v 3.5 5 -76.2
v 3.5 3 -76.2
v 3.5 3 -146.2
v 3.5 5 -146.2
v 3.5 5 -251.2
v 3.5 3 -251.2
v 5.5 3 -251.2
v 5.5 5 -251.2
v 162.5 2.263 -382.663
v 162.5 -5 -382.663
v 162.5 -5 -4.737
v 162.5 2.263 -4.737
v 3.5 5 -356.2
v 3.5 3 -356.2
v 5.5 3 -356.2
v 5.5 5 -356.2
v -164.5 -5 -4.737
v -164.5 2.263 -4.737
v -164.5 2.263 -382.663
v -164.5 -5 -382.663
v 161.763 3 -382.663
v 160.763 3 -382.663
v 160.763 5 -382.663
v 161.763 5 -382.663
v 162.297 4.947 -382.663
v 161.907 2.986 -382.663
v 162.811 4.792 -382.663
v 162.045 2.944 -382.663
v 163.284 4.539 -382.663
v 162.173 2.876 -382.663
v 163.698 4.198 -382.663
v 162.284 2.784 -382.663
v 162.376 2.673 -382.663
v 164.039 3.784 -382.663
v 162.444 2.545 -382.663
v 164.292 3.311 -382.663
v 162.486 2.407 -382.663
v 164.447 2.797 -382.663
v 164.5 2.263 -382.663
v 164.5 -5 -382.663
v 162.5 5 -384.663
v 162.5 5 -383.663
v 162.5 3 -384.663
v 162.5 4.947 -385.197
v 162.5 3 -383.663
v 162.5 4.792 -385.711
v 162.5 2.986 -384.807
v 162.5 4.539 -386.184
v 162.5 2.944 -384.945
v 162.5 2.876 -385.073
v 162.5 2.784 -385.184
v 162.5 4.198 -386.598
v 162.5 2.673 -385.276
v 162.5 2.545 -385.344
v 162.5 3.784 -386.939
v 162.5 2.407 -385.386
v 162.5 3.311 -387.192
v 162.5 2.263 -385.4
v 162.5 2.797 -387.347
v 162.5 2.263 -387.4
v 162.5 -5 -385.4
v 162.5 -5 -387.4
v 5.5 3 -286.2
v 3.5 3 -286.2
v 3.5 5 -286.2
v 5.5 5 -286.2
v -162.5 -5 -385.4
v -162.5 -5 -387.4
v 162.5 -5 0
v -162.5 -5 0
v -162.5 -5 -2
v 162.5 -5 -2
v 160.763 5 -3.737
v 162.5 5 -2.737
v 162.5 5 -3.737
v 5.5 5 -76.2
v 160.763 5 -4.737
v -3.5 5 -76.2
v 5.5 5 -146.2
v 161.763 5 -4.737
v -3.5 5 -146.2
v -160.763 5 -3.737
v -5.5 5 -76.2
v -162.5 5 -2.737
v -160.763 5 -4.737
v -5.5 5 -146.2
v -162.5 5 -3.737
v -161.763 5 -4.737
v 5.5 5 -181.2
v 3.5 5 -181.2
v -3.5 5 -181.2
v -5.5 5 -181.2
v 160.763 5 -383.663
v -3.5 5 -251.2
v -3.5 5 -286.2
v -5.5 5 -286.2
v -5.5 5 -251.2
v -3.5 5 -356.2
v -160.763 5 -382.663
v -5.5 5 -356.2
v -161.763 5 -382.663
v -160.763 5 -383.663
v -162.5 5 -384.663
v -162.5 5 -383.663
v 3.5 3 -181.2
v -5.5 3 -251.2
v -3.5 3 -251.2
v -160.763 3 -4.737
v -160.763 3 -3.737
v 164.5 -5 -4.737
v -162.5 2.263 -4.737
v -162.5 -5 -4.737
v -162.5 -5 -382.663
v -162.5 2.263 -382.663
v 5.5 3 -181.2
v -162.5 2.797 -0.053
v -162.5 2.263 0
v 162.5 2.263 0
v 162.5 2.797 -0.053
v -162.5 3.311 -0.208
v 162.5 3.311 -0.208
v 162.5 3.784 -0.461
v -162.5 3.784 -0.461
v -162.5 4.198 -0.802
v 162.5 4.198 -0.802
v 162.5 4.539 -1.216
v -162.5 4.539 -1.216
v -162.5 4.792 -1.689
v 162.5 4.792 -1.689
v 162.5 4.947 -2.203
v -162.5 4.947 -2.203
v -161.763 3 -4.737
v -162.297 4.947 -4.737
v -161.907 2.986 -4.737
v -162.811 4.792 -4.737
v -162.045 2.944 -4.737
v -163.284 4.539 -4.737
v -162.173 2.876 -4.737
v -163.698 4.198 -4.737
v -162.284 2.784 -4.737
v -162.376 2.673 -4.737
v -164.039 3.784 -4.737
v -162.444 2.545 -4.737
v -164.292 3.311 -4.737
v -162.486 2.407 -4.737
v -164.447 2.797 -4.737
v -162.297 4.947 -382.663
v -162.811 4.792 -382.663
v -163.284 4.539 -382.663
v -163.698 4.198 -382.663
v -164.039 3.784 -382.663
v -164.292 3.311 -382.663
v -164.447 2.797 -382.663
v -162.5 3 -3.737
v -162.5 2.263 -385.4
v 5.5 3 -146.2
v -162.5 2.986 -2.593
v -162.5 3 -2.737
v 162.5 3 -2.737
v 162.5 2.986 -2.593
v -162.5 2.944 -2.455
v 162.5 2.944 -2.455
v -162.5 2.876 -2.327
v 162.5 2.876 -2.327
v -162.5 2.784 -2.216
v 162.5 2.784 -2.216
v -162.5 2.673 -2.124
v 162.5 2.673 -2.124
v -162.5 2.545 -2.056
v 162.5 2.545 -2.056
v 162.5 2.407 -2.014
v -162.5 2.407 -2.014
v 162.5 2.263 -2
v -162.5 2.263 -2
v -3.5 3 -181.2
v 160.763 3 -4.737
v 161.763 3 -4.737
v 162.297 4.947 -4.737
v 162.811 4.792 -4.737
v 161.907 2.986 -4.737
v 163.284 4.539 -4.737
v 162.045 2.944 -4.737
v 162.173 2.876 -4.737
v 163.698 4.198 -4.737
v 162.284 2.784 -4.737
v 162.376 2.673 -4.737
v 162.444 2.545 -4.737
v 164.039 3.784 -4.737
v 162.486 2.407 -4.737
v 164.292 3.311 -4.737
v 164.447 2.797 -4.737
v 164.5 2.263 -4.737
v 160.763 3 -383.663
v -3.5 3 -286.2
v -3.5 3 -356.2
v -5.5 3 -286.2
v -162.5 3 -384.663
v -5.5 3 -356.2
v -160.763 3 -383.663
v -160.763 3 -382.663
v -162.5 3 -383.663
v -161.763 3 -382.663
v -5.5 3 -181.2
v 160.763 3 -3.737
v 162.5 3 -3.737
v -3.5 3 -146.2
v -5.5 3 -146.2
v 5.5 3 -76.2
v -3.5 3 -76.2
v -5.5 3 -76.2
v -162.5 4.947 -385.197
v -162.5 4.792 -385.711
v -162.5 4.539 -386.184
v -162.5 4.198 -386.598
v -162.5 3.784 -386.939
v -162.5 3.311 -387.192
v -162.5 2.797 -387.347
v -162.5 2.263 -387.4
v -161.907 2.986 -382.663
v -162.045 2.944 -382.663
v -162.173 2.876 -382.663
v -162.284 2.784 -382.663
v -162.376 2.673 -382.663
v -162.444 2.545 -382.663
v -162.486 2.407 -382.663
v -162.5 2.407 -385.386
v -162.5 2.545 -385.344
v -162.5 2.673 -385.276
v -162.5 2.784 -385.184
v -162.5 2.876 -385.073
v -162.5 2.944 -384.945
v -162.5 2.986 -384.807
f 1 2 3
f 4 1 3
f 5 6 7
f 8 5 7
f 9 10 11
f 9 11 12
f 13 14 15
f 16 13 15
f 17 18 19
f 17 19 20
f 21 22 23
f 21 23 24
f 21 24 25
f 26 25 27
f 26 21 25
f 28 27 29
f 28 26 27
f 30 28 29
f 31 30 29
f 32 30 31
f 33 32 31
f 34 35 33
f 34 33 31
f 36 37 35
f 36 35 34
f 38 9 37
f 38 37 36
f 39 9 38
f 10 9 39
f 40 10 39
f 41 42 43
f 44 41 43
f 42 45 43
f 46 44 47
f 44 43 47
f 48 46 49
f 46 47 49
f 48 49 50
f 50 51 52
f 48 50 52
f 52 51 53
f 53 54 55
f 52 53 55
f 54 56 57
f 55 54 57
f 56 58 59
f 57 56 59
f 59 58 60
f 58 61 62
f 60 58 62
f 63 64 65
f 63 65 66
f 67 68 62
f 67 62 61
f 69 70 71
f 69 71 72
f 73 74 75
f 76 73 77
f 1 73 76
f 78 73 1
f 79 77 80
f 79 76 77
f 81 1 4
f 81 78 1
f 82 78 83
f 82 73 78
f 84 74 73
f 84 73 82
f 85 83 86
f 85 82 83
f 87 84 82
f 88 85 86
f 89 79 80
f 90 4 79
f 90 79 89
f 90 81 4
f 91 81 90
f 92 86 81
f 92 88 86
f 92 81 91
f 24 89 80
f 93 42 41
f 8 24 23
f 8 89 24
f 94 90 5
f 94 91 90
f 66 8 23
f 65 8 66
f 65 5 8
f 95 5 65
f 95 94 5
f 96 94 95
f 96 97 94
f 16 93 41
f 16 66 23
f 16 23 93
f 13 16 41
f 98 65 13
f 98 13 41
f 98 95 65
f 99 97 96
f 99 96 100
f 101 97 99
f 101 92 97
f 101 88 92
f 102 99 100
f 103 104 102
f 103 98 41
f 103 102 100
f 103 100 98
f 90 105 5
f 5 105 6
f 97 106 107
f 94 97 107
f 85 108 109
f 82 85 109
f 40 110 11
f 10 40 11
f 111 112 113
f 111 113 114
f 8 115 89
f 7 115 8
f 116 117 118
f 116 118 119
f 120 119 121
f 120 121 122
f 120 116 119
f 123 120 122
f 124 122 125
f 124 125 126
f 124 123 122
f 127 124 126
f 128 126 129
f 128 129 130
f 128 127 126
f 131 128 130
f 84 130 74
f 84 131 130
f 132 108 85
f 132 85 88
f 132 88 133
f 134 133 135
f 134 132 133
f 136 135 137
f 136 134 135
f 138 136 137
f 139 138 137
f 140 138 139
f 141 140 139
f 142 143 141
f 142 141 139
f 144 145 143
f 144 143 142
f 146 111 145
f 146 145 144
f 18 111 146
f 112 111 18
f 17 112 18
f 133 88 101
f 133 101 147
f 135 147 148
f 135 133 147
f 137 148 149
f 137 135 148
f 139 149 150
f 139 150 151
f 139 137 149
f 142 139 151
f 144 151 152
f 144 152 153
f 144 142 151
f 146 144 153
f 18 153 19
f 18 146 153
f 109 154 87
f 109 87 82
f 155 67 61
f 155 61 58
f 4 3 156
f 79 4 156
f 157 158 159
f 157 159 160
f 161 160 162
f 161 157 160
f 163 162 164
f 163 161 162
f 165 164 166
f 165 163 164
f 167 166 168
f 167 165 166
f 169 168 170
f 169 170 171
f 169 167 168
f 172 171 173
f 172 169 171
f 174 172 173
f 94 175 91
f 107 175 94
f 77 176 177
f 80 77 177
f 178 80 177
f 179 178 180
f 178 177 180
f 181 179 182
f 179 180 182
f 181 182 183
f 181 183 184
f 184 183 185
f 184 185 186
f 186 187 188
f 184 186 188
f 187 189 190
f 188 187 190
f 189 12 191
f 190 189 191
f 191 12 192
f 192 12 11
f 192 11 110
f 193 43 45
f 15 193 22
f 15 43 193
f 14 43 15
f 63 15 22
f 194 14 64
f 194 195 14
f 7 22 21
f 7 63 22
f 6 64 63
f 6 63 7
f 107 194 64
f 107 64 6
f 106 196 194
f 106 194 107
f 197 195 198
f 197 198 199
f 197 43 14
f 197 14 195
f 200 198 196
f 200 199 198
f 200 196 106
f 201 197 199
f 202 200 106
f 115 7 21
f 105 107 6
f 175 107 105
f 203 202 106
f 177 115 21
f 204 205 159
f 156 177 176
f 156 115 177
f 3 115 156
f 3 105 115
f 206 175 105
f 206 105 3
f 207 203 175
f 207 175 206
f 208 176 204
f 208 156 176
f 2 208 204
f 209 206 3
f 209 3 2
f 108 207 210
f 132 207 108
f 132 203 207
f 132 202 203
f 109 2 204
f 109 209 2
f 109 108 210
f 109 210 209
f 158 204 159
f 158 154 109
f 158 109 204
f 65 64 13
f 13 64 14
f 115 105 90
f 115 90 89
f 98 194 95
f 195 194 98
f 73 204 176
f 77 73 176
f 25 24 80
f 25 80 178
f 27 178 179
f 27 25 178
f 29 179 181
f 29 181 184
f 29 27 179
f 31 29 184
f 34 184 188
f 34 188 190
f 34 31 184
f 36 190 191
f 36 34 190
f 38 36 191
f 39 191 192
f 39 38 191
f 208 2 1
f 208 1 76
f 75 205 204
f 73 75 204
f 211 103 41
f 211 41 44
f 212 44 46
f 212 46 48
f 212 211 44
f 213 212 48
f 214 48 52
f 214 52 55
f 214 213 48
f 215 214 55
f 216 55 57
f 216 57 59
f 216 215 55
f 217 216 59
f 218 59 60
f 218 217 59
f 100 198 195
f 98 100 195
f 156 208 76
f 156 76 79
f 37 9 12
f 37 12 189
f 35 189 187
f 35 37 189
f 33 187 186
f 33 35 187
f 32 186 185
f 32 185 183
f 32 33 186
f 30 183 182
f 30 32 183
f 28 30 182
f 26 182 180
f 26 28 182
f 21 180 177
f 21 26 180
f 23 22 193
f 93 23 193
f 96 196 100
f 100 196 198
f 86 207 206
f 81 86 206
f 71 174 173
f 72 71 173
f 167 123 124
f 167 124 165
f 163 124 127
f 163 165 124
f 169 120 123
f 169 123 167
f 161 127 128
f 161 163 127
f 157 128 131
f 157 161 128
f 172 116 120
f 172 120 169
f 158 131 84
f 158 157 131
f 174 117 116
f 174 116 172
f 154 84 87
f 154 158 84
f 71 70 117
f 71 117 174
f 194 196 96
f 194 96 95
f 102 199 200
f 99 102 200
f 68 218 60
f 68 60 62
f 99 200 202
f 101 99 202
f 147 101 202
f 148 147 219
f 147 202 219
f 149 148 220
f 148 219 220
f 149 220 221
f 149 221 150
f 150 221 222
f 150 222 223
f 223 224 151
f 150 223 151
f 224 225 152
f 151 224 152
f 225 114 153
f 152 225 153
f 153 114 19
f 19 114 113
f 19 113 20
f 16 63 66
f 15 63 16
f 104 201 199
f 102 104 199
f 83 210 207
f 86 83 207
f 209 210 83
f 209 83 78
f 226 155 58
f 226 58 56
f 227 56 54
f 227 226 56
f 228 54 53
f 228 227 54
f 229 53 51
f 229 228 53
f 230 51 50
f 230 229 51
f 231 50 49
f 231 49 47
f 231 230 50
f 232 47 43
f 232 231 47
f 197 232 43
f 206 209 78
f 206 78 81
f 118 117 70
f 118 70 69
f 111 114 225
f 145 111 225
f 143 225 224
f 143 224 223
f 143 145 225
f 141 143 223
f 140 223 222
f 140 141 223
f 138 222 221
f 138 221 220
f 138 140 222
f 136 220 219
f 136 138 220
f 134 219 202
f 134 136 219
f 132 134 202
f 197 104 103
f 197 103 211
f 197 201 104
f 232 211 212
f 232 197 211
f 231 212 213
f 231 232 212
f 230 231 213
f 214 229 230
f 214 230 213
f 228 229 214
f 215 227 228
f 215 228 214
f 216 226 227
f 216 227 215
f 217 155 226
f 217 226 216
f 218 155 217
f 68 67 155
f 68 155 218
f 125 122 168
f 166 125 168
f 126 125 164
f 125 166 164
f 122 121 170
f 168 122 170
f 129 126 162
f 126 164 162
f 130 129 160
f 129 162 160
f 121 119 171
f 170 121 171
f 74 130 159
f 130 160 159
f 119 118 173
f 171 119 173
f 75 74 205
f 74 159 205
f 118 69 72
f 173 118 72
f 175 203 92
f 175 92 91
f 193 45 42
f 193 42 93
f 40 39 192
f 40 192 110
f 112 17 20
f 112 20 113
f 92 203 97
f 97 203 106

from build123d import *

# Parameters (mm, degrees)
SKETCH1_W                     = 325
SKETCH1_H                     = 10
BASE_FLANGE1_DEPTH            = 2
EDGE_FLANGE1_STRIP_W          = 9.4732
EDGE_FLANGE1_STRIP_H          = 2
EDGE_FLANGE1_STRIP_CUT_DEPTH  = 325
EDGE_FLANGE1_DEPTH            = 325
EDGE_FLANGE2_STRIP_W          = 9.4732
EDGE_FLANGE2_STRIP_H          = 2
EDGE_FLANGE2_STRIP_CUT_DEPTH  = 325
EDGE_FLANGE2_DEPTH            = 325
EDGE_FLANGE3_STRIP_W          = 9.4732
EDGE_FLANGE3_STRIP_H          = 2
EDGE_FLANGE3_STRIP_CUT_DEPTH  = 377.9268
EDGE_FLANGE3_RELIEF_W         = 10.4732
EDGE_FLANGE3_RELIEF_H         = 1
EDGE_FLANGE3_RELIEF_CUT_DEPTH = 2
EDGE_FLANGE3_DEPTH            = 377.9268
EDGE_FLANGE4_STRIP_W          = 9.4732
EDGE_FLANGE4_STRIP_H          = 2
EDGE_FLANGE4_STRIP_CUT_DEPTH  = 377.9268
EDGE_FLANGE4_RELIEF_W         = 10.4732
EDGE_FLANGE4_RELIEF_H         = 1
EDGE_FLANGE4_RELIEF_CUT_DEPTH = 2
EDGE_FLANGE4_DEPTH            = 377.9268
CUT_EXTRUDE1_DEPTH            = 421.997636573
CUT_EXTRUDE1_DEPTH_BACK       = 421.997636573
SKETCH14_W                    = 2
SKETCH14_H                    = 70


# Sheet-metal steps are written as plain solids
with BuildPart() as part:
    # Sketch1 → Base-Flange1 (new body)
    with BuildSketch(Plane.XY):
        Rectangle(SKETCH1_W, SKETCH1_H)
    extrude(amount=-BASE_FLANGE1_DEPTH)

    # Edge-Flange1 strip (across the edge) → Edge-Flange1 strip cut (cut)
    with BuildSketch(Plane(origin=(-162.5, 5, -2), x_dir=(0, -1, 0), z_dir=(1, 0, 0))):
        with Locations((-2, -1)):
            Rectangle(EDGE_FLANGE1_STRIP_W, EDGE_FLANGE1_STRIP_H)
    extrude(amount=EDGE_FLANGE1_STRIP_CUT_DEPTH, mode=Mode.SUBTRACT)

    # Edge-Flange1 section (across the edge) → Edge-Flange1 (add)
    with BuildSketch(Plane(origin=(-162.5, 5, -2), x_dir=(0, -1, 0), z_dir=(1, 0, 0))):
        with BuildLine():
            Line((0, 0.7366), (0, 385.4))
            Line((0, 385.4), (2, 385.4))
            Line((2, 385.4), (2, 0.7366))
            ThreePointArc((2, 0.7366), (2.215745145, 0.215745145), (2.7366, 0))
            Line((2.7366, 0), (2.7366, -2))
            ThreePointArc((2.7366, -2), (0.801531583, -1.198468417), (0, 0.7366))
        make_face()
    extrude(amount=EDGE_FLANGE1_DEPTH)

    # Edge-Flange2 strip (across the edge) → Edge-Flange2 strip cut (cut)
    with BuildSketch(Plane(origin=(-162.5, 3, -387.4), x_dir=(0, 0, 1), z_dir=(1, 0, 0))):
        with Locations((-2, -1)):
            Rectangle(EDGE_FLANGE2_STRIP_W, EDGE_FLANGE2_STRIP_H)
    extrude(amount=EDGE_FLANGE2_STRIP_CUT_DEPTH, mode=Mode.SUBTRACT)

    # Edge-Flange2 section (across the edge) → Edge-Flange2 (add)
    with BuildSketch(Plane(origin=(-162.5, 3, -387.4), x_dir=(0, 0, 1), z_dir=(1, 0, 0))):
        with BuildLine():
            Line((0, 0.7366), (0, 8))
            Line((0, 8), (2, 8))
            Line((2, 8), (2, 0.7366))
            ThreePointArc((2, 0.7366), (2.215745145, 0.215745145), (2.7366, 0))
            Line((2.7366, 0), (2.7366, -2))
            ThreePointArc((2.7366, -2), (0.801531583, -1.198468417), (0, 0.7366))
        make_face()
    extrude(amount=EDGE_FLANGE2_DEPTH)

    # Edge-Flange3 strip (across the edge) → Edge-Flange3 strip cut (cut)
    with BuildSketch(Plane(origin=(162.5, 3, -382.6634), x_dir=(-1, 0, 0), z_dir=(0, 0, 1))):
        with Locations((-4, -1)):
            Rectangle(EDGE_FLANGE3_STRIP_W, EDGE_FLANGE3_STRIP_H)
    extrude(amount=EDGE_FLANGE3_STRIP_CUT_DEPTH, mode=Mode.SUBTRACT)

    # Edge-Flange3 relief (on the sheet) → Edge-Flange3 relief cut (cut)
    with BuildSketch(Plane(origin=(161.7634, 3, -382.6634), x_dir=(-1, 0, 0), z_dir=(0, -1, 0))):
        with Locations((-4.2366, 0.5)):
            Rectangle(EDGE_FLANGE3_RELIEF_W, EDGE_FLANGE3_RELIEF_H)
        with Locations((-4.2366, -378.4268)):
            Rectangle(EDGE_FLANGE3_RELIEF_W, EDGE_FLANGE3_RELIEF_H)
    extrude(amount=-EDGE_FLANGE3_RELIEF_CUT_DEPTH, mode=Mode.SUBTRACT)

    # Edge-Flange3 section (across the edge) → Edge-Flange3 (add)
    with BuildSketch(Plane(origin=(162.5, 3, -382.6634), x_dir=(-1, 0, 0), z_dir=(0, 0, 1))):
        with BuildLine():
            Line((-2, 0.7366), (-2, 8))
            Line((-2, 8), (0, 8))
            Line((0, 8), (0, 0.7366))
            ThreePointArc((0, 0.7366), (0.215745145, 0.215745145), (0.7366, 0))
            Line((0.7366, 0), (0.7366, -2))
            ThreePointArc((0.7366, -2), (-1.198468417, -1.198468417), (-2, 0.7366))
        make_face()
    extrude(amount=EDGE_FLANGE3_DEPTH)

    # Edge-Flange4 strip (across the edge) → Edge-Flange4 strip cut (cut)
    with BuildSketch(Plane(origin=(-162.5, 3, -4.7366), x_dir=(1, 0, 0), z_dir=(0, 0, -1))):
        with Locations((-4, -1)):
            Rectangle(EDGE_FLANGE4_STRIP_W, EDGE_FLANGE4_STRIP_H)
    extrude(amount=EDGE_FLANGE4_STRIP_CUT_DEPTH, mode=Mode.SUBTRACT)

    # Edge-Flange4 relief (on the sheet) → Edge-Flange4 relief cut (cut)
    with BuildSketch(Plane(origin=(-161.7634, 3, -4.7366), x_dir=(1, 0, 0), z_dir=(0, -1, 0))):
        with Locations((-4.2366, 0.5)):
            Rectangle(EDGE_FLANGE4_RELIEF_W, EDGE_FLANGE4_RELIEF_H)
        with Locations((-4.2366, -378.4268)):
            Rectangle(EDGE_FLANGE4_RELIEF_W, EDGE_FLANGE4_RELIEF_H)
    extrude(amount=-EDGE_FLANGE4_RELIEF_CUT_DEPTH, mode=Mode.SUBTRACT)

    # Edge-Flange4 section (across the edge) → Edge-Flange4 (add)
    with BuildSketch(Plane(origin=(-162.5, 3, -4.7366), x_dir=(1, 0, 0), z_dir=(0, 0, -1))):
        with BuildLine():
            Line((-2, 0.7366), (-2, 8))
            Line((-2, 8), (0, 8))
            Line((0, 8), (0, 0.7366))
            ThreePointArc((0, 0.7366), (0.215745145, 0.215745145), (0.7366, 0))
            Line((0.7366, 0), (0.7366, -2))
            ThreePointArc((0.7366, -2), (-1.198468417, -1.198468417), (-2, 0.7366))
        make_face()
    extrude(amount=EDGE_FLANGE4_DEPTH)

    # Sketch14 → Cut-Extrude1 (cut, two sides: drawn at the far end of the back side and taken through both)
    with BuildSketch(Plane(origin=(0, 5, 0), x_dir=(1, 0, 0), z_dir=(0, 1, 0)).offset(-CUT_EXTRUDE1_DEPTH_BACK)):
        with Locations((-4.5, 321.2)):
            Rectangle(SKETCH14_W, SKETCH14_H)
        with Locations((4.5, 321.2)):
            Rectangle(SKETCH14_W, SKETCH14_H)
        with Locations((-4.5, 216.2)):
            Rectangle(SKETCH14_W, SKETCH14_H)
        with Locations((4.5, 216.2)):
            Rectangle(SKETCH14_W, SKETCH14_H)
        with Locations((-4.5, 111.2)):
            Rectangle(SKETCH14_W, SKETCH14_H)
        with Locations((4.5, 111.2)):
            Rectangle(SKETCH14_W, SKETCH14_H)
    extrude(amount=CUT_EXTRUDE1_DEPTH + CUT_EXTRUDE1_DEPTH_BACK, mode=Mode.SUBTRACT)


solid = part.part
